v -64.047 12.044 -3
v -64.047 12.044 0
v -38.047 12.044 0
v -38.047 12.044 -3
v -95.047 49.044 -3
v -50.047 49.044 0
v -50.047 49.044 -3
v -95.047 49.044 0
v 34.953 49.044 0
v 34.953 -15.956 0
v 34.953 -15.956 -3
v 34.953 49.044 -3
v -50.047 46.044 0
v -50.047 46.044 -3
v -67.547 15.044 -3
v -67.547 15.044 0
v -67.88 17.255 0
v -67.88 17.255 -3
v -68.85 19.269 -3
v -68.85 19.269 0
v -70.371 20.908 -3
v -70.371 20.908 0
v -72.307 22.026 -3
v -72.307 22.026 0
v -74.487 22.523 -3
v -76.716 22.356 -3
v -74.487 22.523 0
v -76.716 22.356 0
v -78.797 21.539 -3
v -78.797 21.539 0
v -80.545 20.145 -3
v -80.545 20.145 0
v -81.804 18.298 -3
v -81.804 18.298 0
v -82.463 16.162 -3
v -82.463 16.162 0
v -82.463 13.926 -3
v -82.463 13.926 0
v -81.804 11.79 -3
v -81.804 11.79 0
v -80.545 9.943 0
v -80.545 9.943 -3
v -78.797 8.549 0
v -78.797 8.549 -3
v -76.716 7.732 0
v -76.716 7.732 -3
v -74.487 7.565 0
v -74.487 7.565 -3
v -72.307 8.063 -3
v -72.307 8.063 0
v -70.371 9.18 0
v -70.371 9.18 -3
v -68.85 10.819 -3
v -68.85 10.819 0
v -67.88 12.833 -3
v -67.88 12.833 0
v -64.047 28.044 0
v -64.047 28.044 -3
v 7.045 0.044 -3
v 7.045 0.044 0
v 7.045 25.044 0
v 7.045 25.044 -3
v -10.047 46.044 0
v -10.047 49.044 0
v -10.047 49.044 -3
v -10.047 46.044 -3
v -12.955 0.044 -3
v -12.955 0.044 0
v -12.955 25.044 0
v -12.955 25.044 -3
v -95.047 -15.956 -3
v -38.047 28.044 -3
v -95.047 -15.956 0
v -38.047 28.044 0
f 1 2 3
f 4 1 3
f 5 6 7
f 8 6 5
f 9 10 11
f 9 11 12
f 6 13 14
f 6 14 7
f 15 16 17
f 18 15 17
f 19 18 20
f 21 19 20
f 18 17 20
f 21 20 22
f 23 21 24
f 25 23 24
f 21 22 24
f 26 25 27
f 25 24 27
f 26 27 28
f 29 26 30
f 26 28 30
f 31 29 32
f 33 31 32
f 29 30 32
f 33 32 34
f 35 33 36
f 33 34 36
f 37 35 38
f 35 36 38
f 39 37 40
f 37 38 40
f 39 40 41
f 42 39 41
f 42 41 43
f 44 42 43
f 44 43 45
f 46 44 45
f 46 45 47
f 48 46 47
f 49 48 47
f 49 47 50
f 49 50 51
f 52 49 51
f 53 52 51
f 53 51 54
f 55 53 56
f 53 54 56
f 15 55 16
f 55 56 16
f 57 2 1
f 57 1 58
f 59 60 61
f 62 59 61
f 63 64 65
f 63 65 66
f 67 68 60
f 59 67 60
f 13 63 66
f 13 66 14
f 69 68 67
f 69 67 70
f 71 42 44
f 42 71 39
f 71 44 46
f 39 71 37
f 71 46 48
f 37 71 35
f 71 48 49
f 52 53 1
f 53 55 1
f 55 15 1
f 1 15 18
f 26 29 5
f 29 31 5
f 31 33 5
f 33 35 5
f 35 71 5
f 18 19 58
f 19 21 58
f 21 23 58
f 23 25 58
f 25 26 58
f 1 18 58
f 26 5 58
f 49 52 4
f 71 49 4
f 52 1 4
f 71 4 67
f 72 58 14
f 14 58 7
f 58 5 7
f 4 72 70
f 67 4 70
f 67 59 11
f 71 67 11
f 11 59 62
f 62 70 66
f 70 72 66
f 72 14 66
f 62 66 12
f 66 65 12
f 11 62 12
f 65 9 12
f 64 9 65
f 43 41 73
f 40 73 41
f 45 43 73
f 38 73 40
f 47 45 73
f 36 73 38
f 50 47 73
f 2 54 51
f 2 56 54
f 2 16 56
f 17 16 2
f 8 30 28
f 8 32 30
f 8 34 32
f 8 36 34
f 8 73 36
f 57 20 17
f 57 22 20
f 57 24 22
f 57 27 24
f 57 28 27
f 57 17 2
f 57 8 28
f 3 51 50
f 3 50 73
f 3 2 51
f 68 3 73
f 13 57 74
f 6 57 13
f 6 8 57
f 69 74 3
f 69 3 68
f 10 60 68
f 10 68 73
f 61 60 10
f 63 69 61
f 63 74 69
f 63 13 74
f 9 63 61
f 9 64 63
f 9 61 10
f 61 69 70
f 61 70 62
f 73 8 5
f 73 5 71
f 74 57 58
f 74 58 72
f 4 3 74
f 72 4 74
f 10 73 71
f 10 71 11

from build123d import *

# Parameters (mm, degrees)
ESBO_O2_R                = 7.5
ESBO_O2_W                = 20
ESBO_O2_H                = 25
ESBO_O2_W_2              = 26
ESBO_O2_H_2              = 16
RESSALTO_EXTRUS_O1_DEPTH = 3


with BuildPart() as part:
    # Esboço2 → Ressalto-extrusão1 (new body)
    with BuildSketch(Plane.XY):
        Polygon((-50.047132184, 49.044084736), (-95.047132184, 49.044084736), (-95.047132184, -15.955915264), (34.952867816, -15.955915264), (34.952867816, 49.044084736), (-10.047132184, 49.044084736), (-10.047132184, 46.044084736), (-50.047132184, 46.044084736), align=None)
        with Locations((-75.047132184, 15.044084736)):
            Circle(ESBO_O2_R, mode=Mode.SUBTRACT)
        with Locations((-2.954931, 12.544084736)):
            Rectangle(ESBO_O2_W, ESBO_O2_H, mode=Mode.SUBTRACT)
        with Locations((-51.047132184, 20.044084736)):
            Rectangle(ESBO_O2_W_2, ESBO_O2_H_2, mode=Mode.SUBTRACT)
    extrude(amount=-RESSALTO_EXTRUS_O1_DEPTH)


solid = part.part
